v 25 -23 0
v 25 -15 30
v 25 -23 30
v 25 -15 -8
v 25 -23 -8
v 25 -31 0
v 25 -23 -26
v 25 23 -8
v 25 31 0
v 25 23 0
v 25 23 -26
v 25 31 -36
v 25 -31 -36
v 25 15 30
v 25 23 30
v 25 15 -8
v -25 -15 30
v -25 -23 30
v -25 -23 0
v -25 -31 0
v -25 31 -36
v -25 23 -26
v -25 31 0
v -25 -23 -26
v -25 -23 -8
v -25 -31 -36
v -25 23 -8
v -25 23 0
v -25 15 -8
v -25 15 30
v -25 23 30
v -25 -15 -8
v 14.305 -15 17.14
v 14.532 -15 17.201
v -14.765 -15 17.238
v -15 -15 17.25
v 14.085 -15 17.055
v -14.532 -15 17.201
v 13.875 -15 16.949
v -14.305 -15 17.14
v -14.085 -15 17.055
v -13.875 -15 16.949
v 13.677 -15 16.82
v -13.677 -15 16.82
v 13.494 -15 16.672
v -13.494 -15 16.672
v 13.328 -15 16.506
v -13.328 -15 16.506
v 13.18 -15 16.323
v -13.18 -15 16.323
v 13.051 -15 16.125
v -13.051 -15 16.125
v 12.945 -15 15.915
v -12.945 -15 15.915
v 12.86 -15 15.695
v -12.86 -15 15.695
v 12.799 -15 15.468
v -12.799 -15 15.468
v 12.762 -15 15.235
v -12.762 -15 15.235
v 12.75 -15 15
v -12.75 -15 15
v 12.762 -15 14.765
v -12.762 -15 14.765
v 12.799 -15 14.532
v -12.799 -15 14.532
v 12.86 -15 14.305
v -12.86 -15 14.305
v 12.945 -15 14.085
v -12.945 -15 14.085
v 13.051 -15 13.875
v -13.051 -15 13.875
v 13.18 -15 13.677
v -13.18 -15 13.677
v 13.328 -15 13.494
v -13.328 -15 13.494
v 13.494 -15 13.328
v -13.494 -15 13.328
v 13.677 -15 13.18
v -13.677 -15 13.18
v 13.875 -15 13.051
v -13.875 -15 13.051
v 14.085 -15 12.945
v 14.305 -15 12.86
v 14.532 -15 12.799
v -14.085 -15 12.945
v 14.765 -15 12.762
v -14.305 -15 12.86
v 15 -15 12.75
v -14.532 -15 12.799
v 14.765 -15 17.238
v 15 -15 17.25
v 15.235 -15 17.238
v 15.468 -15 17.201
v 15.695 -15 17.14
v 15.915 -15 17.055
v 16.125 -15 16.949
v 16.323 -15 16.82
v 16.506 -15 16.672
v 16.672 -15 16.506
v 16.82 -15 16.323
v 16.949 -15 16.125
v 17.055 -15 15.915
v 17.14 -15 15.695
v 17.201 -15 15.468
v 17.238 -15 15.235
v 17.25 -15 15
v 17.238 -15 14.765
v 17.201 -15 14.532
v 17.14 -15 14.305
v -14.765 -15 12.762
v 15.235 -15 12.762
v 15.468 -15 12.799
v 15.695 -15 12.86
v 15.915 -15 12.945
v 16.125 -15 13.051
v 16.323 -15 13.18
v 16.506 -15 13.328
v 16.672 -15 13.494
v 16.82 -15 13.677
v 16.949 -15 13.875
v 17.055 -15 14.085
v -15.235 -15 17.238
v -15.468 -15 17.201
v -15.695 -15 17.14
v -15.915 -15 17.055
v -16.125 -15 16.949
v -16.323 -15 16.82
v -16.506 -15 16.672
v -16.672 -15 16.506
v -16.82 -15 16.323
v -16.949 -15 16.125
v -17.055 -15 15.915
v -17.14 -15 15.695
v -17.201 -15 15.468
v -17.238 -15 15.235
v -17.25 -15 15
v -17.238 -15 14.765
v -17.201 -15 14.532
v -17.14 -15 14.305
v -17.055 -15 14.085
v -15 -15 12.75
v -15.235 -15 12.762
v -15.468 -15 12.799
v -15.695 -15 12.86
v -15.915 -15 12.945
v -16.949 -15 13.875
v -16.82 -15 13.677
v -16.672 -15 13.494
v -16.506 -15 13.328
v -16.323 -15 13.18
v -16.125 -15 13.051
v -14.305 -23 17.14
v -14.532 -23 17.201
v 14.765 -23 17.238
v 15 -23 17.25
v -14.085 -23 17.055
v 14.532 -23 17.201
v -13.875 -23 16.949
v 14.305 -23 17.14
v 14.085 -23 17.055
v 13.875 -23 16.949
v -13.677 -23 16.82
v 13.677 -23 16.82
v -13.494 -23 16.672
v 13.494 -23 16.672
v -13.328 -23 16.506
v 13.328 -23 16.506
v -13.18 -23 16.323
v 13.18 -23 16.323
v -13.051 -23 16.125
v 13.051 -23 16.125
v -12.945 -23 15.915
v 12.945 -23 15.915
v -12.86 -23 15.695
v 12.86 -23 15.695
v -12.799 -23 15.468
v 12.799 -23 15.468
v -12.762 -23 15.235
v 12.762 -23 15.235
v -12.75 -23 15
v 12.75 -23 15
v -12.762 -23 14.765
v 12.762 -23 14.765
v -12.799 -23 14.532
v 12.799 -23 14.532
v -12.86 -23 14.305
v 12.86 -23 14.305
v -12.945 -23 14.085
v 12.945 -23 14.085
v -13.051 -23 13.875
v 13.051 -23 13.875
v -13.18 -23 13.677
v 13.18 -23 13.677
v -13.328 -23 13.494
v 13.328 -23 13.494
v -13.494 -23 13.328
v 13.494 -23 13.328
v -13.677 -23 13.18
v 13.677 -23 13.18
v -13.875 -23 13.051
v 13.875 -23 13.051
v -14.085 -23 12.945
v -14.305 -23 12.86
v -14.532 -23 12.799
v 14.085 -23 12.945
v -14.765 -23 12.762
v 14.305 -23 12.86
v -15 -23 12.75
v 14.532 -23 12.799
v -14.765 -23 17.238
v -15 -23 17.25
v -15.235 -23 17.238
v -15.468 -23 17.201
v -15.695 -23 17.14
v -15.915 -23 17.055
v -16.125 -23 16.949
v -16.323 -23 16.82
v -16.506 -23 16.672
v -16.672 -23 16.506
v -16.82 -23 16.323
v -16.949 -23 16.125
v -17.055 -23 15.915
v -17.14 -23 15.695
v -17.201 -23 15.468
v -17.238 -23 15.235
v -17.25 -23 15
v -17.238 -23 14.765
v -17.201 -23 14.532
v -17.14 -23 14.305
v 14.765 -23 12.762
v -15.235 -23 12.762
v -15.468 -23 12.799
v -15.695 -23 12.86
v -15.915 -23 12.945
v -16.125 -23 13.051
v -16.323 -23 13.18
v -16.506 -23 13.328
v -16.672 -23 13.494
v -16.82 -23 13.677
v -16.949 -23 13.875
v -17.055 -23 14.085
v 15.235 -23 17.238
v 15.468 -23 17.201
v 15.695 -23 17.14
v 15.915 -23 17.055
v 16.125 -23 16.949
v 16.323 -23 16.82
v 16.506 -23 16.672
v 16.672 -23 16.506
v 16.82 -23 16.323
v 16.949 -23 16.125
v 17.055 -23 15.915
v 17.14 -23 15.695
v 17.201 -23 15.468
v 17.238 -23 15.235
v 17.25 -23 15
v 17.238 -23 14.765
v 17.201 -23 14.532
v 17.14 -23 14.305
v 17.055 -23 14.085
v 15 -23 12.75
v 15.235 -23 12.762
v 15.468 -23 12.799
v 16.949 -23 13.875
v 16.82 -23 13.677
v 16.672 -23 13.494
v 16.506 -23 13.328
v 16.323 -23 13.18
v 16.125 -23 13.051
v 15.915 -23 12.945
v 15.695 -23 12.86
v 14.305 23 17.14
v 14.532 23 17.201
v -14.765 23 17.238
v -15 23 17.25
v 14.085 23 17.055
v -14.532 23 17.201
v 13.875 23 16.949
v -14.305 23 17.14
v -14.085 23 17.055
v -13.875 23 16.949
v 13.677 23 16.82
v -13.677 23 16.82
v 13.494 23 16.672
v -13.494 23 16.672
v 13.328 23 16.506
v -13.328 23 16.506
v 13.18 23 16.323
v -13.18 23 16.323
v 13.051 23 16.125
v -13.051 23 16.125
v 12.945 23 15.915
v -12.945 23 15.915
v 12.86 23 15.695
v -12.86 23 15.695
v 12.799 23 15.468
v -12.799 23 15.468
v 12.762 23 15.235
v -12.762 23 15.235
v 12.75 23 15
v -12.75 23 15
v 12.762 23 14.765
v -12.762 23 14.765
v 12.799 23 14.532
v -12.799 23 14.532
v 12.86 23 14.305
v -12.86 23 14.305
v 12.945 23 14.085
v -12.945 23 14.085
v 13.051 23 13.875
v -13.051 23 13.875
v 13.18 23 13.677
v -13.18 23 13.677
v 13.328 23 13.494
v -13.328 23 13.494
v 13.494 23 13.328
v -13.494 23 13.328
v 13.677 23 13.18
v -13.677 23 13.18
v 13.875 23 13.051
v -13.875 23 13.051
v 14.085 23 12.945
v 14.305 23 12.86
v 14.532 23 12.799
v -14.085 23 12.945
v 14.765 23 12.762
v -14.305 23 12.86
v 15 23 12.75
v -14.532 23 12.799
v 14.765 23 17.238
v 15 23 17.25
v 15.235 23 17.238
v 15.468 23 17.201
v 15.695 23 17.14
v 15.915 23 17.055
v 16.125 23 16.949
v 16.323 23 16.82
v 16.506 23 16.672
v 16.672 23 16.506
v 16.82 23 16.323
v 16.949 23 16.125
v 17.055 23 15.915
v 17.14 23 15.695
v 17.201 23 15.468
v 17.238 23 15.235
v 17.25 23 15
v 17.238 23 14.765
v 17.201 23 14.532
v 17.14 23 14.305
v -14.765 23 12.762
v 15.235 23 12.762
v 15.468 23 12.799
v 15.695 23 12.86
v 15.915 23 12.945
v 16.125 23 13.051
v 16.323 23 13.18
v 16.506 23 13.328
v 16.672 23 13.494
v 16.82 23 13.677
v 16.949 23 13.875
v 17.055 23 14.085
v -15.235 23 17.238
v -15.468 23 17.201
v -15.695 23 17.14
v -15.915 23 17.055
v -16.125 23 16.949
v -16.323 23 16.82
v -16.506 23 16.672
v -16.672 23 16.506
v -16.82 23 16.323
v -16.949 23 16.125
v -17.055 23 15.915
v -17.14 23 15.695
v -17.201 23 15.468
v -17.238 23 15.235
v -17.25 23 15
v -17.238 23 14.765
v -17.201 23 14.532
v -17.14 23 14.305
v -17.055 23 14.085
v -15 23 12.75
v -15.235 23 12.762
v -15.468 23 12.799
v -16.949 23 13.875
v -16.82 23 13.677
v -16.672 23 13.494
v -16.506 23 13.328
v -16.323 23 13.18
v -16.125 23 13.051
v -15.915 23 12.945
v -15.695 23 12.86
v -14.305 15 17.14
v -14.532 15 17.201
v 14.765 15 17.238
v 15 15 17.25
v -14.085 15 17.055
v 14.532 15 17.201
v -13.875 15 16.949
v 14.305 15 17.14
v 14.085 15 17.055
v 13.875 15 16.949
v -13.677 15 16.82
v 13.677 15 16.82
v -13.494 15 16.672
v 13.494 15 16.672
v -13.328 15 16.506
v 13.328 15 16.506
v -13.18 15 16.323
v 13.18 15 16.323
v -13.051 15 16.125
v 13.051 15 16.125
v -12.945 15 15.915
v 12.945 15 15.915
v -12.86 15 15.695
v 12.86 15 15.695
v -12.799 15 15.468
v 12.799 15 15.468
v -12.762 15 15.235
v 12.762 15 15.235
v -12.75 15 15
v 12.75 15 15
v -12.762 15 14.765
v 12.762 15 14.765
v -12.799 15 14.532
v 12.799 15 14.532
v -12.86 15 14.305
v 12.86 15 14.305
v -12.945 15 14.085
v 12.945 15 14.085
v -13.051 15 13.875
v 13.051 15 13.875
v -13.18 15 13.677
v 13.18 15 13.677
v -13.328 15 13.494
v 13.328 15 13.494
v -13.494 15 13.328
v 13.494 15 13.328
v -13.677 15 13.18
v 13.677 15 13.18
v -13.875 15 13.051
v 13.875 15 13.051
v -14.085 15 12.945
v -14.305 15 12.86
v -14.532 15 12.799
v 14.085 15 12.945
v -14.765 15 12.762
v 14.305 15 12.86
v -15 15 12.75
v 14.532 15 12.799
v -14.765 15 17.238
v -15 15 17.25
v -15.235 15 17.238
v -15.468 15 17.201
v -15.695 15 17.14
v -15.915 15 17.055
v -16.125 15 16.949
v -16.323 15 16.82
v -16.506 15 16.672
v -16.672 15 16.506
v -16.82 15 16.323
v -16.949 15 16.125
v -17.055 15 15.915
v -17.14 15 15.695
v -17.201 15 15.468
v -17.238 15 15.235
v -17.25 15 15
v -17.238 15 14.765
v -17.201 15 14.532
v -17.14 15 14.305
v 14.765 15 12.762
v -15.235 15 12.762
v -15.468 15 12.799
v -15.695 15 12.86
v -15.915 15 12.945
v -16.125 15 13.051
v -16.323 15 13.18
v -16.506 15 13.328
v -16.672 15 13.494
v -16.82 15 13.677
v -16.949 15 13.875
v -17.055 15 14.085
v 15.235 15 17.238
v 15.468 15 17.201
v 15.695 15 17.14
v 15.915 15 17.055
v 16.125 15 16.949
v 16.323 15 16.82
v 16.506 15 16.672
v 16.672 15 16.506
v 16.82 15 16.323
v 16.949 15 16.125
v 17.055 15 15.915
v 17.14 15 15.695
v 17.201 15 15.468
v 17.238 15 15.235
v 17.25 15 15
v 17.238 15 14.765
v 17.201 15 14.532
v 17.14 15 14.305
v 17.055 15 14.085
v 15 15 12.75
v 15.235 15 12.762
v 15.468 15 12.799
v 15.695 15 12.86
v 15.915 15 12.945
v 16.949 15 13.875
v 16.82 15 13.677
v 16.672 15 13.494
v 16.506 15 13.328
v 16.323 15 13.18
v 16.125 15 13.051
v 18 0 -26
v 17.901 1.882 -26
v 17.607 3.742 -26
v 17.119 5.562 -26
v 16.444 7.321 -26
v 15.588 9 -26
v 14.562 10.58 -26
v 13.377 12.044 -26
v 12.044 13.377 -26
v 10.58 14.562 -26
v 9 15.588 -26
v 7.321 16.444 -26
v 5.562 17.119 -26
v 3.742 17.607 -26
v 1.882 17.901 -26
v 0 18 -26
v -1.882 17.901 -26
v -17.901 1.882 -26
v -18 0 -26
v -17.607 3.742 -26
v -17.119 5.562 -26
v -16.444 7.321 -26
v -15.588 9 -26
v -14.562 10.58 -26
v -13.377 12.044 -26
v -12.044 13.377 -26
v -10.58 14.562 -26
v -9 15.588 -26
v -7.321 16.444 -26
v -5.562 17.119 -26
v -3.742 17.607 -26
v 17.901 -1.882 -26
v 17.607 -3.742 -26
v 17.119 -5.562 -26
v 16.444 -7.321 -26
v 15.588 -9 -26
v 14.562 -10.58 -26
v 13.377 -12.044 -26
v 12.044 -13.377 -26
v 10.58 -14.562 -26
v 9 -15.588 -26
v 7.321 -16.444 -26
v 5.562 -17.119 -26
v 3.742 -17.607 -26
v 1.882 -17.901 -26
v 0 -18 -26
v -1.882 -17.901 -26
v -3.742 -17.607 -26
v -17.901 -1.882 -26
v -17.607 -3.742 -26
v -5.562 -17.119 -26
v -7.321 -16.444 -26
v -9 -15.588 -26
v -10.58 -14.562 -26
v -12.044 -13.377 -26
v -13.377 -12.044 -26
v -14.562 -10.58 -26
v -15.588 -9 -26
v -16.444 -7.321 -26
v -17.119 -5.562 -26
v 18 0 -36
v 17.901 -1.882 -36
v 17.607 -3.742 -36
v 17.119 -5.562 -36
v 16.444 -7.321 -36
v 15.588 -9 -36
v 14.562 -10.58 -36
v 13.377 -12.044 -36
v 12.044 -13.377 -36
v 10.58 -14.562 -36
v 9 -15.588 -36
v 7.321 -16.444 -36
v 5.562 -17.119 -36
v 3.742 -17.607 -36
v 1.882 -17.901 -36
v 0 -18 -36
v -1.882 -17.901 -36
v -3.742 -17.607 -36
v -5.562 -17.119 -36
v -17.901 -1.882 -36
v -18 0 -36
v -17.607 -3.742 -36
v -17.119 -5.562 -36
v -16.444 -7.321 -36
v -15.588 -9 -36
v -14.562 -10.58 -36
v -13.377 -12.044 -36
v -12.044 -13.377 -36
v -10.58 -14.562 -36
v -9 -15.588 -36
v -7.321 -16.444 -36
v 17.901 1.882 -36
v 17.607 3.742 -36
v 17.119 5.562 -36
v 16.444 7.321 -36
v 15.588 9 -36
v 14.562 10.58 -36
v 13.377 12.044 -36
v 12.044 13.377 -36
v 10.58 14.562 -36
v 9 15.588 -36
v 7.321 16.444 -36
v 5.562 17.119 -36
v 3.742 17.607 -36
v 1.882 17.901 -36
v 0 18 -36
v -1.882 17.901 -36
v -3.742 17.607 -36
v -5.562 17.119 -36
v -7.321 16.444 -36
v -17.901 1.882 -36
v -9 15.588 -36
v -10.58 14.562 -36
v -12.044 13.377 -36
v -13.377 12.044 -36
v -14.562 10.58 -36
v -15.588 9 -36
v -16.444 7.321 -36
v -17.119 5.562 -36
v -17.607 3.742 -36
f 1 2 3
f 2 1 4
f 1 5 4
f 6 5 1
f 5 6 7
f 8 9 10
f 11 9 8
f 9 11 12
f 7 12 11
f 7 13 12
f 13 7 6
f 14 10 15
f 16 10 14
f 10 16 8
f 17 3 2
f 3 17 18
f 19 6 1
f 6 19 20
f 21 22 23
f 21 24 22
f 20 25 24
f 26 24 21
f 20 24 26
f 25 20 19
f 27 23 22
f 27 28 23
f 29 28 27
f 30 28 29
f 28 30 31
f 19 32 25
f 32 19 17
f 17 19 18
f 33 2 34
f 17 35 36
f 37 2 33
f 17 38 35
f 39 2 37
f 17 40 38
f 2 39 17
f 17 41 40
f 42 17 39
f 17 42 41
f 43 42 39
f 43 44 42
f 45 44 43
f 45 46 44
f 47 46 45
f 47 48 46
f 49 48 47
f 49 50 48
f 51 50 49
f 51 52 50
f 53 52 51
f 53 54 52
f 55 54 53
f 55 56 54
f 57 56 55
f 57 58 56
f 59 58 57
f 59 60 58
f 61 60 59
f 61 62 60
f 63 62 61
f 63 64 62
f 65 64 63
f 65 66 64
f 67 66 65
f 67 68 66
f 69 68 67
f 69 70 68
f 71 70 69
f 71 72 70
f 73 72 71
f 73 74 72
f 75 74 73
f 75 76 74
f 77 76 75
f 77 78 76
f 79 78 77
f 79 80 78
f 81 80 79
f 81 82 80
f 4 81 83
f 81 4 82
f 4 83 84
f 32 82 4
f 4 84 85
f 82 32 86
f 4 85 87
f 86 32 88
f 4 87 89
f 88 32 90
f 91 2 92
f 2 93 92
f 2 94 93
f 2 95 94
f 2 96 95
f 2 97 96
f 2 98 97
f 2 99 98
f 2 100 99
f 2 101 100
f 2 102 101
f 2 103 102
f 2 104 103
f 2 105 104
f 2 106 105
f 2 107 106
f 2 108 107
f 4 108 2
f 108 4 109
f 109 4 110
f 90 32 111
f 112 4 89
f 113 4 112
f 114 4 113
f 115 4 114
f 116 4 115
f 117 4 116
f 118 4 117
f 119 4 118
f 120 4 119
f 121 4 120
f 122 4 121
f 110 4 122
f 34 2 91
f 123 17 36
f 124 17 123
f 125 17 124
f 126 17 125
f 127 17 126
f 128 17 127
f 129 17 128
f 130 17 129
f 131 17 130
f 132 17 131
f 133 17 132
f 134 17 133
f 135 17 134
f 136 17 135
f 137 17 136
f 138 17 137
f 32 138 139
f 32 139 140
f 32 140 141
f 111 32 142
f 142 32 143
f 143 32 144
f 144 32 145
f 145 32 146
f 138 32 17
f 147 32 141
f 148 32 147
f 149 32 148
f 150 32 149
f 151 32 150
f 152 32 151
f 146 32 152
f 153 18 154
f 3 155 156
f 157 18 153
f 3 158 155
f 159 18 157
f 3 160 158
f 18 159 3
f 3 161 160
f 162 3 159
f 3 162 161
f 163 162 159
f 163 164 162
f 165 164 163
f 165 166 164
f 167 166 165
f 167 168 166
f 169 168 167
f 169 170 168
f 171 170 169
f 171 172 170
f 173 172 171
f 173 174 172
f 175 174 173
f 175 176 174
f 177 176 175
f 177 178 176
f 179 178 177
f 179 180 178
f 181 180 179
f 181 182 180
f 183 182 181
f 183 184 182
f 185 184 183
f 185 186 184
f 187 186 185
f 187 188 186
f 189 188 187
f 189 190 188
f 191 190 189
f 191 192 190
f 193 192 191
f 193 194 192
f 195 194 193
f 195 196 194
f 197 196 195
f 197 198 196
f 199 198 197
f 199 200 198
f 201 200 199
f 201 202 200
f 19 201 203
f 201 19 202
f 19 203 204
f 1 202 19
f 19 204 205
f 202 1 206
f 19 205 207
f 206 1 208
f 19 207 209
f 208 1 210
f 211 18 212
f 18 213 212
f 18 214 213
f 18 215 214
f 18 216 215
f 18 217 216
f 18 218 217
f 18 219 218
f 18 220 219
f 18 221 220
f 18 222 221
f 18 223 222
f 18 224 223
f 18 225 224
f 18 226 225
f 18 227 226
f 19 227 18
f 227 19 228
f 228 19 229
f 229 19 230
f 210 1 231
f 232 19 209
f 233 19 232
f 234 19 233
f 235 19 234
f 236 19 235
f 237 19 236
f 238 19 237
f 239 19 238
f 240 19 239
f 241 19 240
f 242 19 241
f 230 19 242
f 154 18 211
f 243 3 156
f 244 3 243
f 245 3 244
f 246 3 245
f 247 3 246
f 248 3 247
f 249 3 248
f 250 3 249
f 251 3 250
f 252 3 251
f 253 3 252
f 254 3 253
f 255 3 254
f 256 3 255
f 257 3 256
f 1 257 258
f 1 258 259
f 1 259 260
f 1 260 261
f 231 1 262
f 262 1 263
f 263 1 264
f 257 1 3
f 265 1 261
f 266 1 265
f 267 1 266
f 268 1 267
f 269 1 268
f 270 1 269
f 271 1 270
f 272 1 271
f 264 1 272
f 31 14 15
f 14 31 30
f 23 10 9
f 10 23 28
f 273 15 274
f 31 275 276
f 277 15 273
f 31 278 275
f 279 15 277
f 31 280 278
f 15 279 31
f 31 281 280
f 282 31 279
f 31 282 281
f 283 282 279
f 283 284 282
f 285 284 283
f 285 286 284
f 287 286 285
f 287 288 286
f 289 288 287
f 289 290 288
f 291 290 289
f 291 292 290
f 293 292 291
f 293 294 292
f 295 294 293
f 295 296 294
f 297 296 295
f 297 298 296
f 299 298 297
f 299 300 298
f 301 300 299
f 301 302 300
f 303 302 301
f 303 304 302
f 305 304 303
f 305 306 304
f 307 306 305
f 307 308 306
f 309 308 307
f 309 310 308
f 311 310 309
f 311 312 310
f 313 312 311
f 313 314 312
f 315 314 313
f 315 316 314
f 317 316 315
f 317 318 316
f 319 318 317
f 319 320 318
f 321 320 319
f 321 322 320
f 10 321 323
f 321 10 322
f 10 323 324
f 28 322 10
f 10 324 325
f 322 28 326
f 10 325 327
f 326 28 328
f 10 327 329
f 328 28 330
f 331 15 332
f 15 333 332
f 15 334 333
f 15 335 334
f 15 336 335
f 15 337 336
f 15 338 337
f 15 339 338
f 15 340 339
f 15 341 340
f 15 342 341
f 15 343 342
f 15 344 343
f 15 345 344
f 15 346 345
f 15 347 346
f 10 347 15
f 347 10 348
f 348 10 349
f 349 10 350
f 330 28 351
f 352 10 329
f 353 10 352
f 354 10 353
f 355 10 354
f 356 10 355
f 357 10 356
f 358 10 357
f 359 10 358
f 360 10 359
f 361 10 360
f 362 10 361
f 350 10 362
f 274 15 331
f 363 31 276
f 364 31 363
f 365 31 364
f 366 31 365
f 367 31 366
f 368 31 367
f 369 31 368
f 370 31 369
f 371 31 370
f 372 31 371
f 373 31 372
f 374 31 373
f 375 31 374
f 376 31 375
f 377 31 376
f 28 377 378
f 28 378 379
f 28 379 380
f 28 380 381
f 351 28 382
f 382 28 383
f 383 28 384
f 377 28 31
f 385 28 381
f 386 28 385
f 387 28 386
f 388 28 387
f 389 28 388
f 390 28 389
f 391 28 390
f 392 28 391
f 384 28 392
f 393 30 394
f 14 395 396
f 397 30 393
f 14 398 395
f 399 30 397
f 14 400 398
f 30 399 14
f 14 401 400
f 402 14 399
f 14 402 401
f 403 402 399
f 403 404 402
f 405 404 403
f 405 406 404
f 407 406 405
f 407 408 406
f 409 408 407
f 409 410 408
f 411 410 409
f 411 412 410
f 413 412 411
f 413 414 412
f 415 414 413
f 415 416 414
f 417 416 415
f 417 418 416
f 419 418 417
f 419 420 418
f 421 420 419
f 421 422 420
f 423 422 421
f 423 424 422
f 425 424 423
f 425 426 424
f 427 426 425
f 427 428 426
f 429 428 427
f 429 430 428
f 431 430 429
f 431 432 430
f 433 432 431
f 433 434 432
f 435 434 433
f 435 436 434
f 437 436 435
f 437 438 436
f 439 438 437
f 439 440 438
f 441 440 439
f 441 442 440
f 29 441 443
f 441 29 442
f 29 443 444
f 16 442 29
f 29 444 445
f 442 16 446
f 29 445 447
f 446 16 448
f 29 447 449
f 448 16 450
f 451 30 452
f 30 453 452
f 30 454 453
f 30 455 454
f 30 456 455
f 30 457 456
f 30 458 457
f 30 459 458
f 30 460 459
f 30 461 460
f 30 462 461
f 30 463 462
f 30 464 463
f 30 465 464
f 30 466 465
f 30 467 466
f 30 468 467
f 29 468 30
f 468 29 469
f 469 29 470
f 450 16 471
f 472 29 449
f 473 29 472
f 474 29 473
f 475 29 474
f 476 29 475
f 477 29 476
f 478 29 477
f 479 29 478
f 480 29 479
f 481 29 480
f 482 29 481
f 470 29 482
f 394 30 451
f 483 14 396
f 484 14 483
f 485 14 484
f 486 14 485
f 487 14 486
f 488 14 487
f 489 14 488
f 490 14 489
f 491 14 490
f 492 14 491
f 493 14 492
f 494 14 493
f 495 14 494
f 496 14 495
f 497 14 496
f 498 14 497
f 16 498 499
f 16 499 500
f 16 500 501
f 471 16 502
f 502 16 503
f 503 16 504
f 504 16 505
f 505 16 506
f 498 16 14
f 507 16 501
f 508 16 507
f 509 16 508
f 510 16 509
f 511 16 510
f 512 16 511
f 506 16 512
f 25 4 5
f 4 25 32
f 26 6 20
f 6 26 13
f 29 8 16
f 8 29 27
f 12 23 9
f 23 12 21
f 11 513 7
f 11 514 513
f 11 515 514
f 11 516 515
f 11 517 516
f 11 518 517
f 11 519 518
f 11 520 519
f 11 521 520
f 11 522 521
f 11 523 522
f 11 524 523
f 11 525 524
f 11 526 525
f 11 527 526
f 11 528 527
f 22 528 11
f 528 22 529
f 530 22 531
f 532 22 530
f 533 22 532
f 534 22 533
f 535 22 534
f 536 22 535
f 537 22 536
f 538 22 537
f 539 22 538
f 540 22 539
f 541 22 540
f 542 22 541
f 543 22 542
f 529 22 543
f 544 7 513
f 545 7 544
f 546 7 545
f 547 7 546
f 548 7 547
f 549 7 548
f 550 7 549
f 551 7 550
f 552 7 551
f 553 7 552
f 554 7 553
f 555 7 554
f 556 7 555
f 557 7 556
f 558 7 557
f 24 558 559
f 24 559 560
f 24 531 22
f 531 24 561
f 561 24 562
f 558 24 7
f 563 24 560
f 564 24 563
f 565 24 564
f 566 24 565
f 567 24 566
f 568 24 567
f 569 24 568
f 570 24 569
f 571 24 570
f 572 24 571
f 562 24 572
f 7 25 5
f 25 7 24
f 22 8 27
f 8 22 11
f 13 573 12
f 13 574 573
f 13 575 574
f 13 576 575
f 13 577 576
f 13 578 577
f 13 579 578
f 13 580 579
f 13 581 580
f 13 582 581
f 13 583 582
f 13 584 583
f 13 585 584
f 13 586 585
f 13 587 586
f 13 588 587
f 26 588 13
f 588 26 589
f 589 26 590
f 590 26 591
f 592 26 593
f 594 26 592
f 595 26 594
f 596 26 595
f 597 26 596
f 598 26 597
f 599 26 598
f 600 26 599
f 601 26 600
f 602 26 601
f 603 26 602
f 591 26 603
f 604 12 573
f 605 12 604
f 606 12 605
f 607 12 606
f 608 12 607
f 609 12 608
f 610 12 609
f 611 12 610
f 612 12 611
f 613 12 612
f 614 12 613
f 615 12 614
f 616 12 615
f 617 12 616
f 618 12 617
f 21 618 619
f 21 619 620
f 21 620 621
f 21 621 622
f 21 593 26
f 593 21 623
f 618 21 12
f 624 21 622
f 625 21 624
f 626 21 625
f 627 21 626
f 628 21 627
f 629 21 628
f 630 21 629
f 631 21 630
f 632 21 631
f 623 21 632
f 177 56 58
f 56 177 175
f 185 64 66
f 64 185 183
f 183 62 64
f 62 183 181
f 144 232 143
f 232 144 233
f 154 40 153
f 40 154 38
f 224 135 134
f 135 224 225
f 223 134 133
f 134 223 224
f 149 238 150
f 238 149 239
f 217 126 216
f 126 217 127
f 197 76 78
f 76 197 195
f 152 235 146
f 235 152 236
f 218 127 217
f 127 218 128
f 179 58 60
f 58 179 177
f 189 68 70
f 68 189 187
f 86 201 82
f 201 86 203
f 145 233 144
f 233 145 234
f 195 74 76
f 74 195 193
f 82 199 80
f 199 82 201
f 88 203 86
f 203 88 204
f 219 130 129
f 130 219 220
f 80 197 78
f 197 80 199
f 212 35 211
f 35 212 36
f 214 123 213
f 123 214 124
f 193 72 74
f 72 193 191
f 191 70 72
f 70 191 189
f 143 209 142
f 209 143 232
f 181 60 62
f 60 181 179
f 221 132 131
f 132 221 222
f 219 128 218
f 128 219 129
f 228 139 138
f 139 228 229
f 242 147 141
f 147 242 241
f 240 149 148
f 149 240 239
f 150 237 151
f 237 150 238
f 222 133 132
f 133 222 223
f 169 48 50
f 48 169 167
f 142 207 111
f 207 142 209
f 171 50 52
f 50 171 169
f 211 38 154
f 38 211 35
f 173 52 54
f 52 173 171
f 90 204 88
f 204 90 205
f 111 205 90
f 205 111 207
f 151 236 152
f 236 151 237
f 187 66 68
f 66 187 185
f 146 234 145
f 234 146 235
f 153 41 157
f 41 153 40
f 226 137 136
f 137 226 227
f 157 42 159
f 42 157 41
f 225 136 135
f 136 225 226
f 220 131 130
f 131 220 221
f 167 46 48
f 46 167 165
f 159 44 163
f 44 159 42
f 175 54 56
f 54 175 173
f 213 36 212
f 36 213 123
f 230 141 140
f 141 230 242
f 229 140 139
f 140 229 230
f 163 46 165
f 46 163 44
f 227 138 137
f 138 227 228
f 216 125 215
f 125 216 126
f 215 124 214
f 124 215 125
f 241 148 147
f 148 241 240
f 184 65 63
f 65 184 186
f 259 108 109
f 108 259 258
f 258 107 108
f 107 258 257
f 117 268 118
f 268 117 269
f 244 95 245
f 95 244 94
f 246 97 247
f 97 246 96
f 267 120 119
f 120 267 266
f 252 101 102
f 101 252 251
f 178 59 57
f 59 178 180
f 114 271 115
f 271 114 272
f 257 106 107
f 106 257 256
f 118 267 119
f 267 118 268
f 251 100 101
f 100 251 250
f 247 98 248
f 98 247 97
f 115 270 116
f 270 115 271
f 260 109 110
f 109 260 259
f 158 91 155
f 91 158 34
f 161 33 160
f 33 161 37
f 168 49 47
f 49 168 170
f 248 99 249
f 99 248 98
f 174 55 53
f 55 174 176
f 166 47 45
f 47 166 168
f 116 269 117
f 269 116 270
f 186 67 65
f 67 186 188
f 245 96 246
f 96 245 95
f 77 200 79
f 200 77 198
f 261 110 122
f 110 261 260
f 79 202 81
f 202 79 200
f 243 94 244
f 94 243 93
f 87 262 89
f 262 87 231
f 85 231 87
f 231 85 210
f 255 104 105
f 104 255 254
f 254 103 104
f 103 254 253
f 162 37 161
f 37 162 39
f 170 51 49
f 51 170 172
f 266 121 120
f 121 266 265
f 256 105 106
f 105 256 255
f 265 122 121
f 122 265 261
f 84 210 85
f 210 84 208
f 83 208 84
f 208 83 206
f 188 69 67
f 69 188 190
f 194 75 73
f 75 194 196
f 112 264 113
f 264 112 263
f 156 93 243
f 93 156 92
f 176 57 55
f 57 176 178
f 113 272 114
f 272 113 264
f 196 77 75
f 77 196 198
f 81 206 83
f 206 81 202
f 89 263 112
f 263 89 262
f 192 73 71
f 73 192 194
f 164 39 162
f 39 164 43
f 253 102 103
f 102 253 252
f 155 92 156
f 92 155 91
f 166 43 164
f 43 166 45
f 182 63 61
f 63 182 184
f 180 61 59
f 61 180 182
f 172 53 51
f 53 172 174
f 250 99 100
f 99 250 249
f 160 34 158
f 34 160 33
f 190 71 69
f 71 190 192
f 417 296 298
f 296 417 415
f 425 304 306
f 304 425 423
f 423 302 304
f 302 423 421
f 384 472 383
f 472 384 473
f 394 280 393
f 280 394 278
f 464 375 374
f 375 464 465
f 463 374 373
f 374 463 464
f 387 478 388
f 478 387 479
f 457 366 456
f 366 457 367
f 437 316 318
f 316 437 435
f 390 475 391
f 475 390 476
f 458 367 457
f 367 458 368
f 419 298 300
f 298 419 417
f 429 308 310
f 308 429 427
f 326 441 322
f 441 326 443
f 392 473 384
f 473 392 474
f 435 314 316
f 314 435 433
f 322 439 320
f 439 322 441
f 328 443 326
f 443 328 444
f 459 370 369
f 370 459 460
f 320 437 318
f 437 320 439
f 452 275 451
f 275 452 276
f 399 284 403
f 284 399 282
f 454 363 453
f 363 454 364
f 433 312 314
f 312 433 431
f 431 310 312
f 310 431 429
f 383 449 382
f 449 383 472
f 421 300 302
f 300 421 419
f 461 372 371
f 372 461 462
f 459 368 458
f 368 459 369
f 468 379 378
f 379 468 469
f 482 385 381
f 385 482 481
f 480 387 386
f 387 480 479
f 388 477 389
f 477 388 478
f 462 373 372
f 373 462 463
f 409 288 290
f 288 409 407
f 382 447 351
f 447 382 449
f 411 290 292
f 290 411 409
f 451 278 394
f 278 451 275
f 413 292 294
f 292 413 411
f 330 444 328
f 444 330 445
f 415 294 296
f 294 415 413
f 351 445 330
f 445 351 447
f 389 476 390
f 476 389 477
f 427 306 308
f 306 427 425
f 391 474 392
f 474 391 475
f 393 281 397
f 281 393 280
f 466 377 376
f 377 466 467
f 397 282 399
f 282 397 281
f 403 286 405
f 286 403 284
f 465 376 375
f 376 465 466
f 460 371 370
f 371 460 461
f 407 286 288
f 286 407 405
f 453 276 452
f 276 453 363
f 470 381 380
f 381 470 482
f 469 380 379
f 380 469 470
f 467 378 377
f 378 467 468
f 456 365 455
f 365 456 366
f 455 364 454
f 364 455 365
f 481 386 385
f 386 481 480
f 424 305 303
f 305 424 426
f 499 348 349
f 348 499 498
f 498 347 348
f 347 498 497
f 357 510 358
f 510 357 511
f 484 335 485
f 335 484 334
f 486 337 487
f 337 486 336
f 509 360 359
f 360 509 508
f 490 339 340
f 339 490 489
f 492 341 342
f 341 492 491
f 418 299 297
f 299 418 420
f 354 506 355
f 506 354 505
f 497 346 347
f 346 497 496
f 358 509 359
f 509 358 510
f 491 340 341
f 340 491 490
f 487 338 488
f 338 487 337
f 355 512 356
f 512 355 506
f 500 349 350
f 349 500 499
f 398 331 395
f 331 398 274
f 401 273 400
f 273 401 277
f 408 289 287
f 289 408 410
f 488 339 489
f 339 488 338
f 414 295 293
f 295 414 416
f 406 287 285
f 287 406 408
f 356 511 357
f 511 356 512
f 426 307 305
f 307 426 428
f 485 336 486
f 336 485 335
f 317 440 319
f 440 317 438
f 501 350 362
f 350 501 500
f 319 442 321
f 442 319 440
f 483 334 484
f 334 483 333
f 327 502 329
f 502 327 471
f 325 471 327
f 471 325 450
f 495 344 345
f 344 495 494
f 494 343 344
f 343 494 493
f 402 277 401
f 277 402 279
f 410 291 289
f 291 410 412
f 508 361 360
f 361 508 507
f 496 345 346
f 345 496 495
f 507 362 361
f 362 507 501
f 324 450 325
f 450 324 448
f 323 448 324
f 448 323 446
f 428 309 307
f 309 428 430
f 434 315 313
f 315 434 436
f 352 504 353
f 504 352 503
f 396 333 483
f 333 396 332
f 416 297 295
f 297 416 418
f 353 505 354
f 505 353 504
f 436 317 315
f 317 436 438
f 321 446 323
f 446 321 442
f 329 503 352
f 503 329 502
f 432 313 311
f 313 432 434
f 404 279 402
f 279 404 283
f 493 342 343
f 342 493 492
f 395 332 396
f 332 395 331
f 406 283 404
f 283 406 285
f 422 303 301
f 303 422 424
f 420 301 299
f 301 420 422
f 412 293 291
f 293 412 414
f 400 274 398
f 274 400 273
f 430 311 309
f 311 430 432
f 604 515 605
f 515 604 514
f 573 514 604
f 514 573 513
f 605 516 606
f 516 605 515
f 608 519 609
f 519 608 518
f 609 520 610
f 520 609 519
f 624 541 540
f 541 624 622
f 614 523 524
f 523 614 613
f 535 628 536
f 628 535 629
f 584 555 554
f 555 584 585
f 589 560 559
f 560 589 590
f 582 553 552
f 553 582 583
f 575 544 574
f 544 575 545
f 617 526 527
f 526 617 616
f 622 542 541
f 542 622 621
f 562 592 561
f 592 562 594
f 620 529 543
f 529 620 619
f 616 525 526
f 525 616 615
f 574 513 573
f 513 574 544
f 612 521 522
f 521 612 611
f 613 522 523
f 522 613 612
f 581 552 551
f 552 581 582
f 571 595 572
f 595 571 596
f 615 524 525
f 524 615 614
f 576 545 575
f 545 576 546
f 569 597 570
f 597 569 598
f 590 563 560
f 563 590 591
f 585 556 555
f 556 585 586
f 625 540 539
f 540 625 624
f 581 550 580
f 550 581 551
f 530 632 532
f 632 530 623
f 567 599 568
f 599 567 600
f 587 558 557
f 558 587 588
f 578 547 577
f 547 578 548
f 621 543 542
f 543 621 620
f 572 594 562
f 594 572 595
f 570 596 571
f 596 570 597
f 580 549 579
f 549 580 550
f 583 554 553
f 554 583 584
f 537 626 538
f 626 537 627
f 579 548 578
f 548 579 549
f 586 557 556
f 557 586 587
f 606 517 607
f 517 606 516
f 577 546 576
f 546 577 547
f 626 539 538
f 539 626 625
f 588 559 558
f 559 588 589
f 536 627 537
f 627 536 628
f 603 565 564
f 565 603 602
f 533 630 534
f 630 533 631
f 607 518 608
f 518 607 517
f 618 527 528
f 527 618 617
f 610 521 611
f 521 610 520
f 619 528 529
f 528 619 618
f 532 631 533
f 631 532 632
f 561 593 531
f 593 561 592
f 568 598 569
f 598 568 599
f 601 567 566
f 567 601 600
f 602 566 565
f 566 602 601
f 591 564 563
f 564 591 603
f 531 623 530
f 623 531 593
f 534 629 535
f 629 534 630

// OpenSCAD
// file: _params.scad
// =========================================================================
// 공유 파라미터 (모든 개별 부품 파일에서 include)
// 메인 어셈블리: cup_z_x_catrage_frame_water_mic_anti_3030.scad 에서 추출
// 프레임: 600 × 420 × 700mm (3030 프로파일, Y=0 대칭)
// =========================================================================

$fn = 60;  // 부품 출력용 고해상도
GLOBAL_TOLERANCE = 0.2;

// --- [1] 하부 기성품 및 원통 파라미터 ---
X_RAIL_LEN = 290.0;
X_BLOCK_W = 42.0; X_BLOCK_L = 59.0;
X_PITCH_X = 20.0; X_PITCH_Y = 32.0;
X_RAIL_W = 40.0;  X_RAIL_H = 30.0;

MOTOR_W = 42.0;      MOTOR_PITCH = 31.0; MOTOR_HOLE_D = 3.5;    
MOTOR_BOSS_D = 22.0; MOTOR_BOSS_H = 2.0; SCREW_D = 8.0;         

CUP_ID = 100.0;  CUP_WALL = 5.0; CUP_OD = 110.0;     // 아크릴 원통 OD110/ID100
CUP_H = 180.0;   CAGE_H = 60.0;  FLOOR_H = 10.0; PISTON_H = 20.0;     

LIP_D = 30.0;    LIP_H = 5.0;    LEAK_DRAIN_D = 4.0;    
GUIDE_PIPE_D = 10.0; BUSHING_OD = 12.0; BUSHING_H = 8.0;       
DRAIN_RADIUS = 35.0; DRAIN_D = 10.0;        

Y_OFFSET = 85.0; BRKT_H = 12.0; BRKT_D = 122.0; BRKT_ID = 62.0; Z_MOUNT_PCD = 86.0;   

// --- [2] 아크릴 파이프 및 상부 카트리지 ---
ACRYL_ID = 100.0; ACRYL_T = 5.0; ACRYL_OD = ACRYL_ID + (ACRYL_T * 2);  // OD110 (아크릴집 106 재고없음 → 컵과 동일 규격)

REVOLVER_PCD = 240.0;     // 인접 카트리지 웹 9.8mm 확보 (OD110 대응, 230→240)
CARTRIDGE_OD = REVOLVER_PCD + ACRYL_OD + 8; 
TOP_PLATE_H = 15.0;       // 아크릴 15T 통판 (보스홀 단 깊이 10mm)

HUB_D = 60.0;            
SHAFT_D = 12.0;          
HUB_WALL = 4.0;          
HUB_H = 15.0;             // 아크릴 5T × 3장 적층 — 파이프 130mm 대응
POCKET_DEPTH = 5.0;
MID_HUB_Z = 68.5;          // 중단 허브 하면 Z (FLOAT_H=2 보정, 절대좌표 유지)
UPPER_HUB_Z = 135.0;       // 상단 허브 하면 Z (전체 135+15=150 유지)
BOSS_OD = 35.0;
BOSS_H = 11.0;             // 보스11 + 와셔1 = 12, 리세스10 → 허브 2mm 공중

// --- [3] GT2 벨트 구동 시스템 ---
GT2_PITCH     = 2.0;
GT2_BELT_W    = 6.0;
BIG_PULLEY_TEETH = 566;
BIG_PULLEY_PD = BIG_PULLEY_TEETH * GT2_PITCH / PI;
BIG_PULLEY_OD = BIG_PULLEY_PD + 1.0;
SMALL_PULLEY_TEETH = 20;
SMALL_PULLEY_PD = SMALL_PULLEY_TEETH * GT2_PITCH / PI;
SMALL_PULLEY_OD = SMALL_PULLEY_PD + 1.0;

BELT_MOTOR_X = -300;
BELT_MOTOR_Y = -155.5;
BRKT_MOTOR_H = 25.0;
BRKT_MOTOR_W = 45.0;
SLOT_LEN = 10.0;
FLAG_W = 15.0;  FLAG_H = 8.0;  FLAG_T = 1.5;

X_POS_MEASURE = 170.0;   // X_M~X_R 정중앙, X대칭

// --- [4] 3030 프레임 경계 (600×430×700mm) ---
PF = 30;             // 3030 알루미늄 프로파일
WASHER_T = 1.0;     

X_L = -320;
X_M = 60;
X_R = 250;
Y_F = -210;          // 전방 (대칭: -210+30=-180, Y=0 중심)
Y_B = 180;           // 후방 (대칭: 180+30=210, Y=0 중심) — 메인파일과 동기화

Z_BOT = -480;
Z_RAIL = -322;
Z_MID = -TOP_PLATE_H - PF;
Z_TOP = 220;

SUPPORT_PILLAR_H = Z_TOP - PF;

SHAFT_SQ = 20;       // 2020 사각 회전축

// 사각 축 홀 크기
SQ = SHAFT_SQ + GLOBAL_TOLERANCE;  // 20.2mm

// --- 리볼버/컵 축 정렬 (보스홀=판 중심에 리볼버 정렬) ---
REVOLVER_CX = (X_L + X_M + PF)/2;        // 판 중심 = 보스홀 = 리볼버 회전축 (-115)
DROP_X      = REVOLVER_CX + REVOLVER_PCD/2;  // 링 드롭 / 컵 적재 축 (+5)

// --- [5] 모터 체결홀 (베이스 플레이트 ↔ 모터 브래킷 슬롯 공유) ---
MOTOR_BOLT_PITCH    = 25;        // Y피치 (모터축 기준 ±12.5)
MOTOR_BOLT_X_NOMINAL = X_L + 55; // 1열: 판 좌단 55 (모터 기본 위치)
MOTOR_BOLT_X_SHIFT   = X_L + 40; // 2열: 판 좌단 40 (모터 좌측 이동 대비)

// 모터 마운트 볼트 카운터보어 (단볼트용 — 브래킷 두께 25 중 깊게 파냄)
MOTOR_CB_D     = 6.5;            // M3 캡볼트 머리 클리어런스
MOTOR_CB_DEPTH = 19;             // 카운터보어 깊이 (잔여 통과 6mm → M3×10 단볼트)
// main file
// =========================================================================
// [부품] 상부 축 브래킷 (Upper Shaft Support Bracket)
// 가공: 3D 프린팅 (PLA)
// 원점: 보 상면 = Z=0, 축 중심 = XY 원점
// =========================================================================
include <_params.scad>

BRKT_T = 8.0;
BOTTOM_T = 10.0;
FLOAT_H = BOSS_H + WASHER_T - 10;  // 리볼버 Z 오프셋 (2mm)
UPPER_GAP = 2.0;           // 상단 허브 상면↔바닥판 하면 간격
DROP_H = (Z_TOP - PF) - (FLOAT_H + UPPER_HUB_Z + HUB_H + UPPER_GAP + BOTTOM_T);
BOSS_CLEAR = BOSS_OD + 1.0;
PLATE_W = 50.0;
HALF_BEAM = PF / 2;
HALF_GAP = BOSS_CLEAR/2 + 5;

difference() {
    union() {
        // ㅛ 상부: 좌측 탭
        translate([-PLATE_W/2, -HALF_BEAM - BRKT_T, 0])
            cube([PLATE_W, BRKT_T, PF]);
        // ㅛ 상부: 우측 탭
        translate([-PLATE_W/2, HALF_BEAM, 0])
            cube([PLATE_W, BRKT_T, PF]);
        // ㅛ 연결: 좌측 수평 연결판
        translate([-PLATE_W/2, -HALF_GAP - BRKT_T, -BRKT_T])
            cube([PLATE_W, HALF_GAP + BRKT_T - HALF_BEAM, BRKT_T]);
        // ㅛ 연결: 우측 수평 연결판
        translate([-PLATE_W/2, HALF_BEAM, -BRKT_T])
            cube([PLATE_W, HALF_GAP + BRKT_T - HALF_BEAM, BRKT_T]);
        // ㅛ 하부: 좌측 벽
        translate([-PLATE_W/2, -HALF_GAP - BRKT_T, -DROP_H])
            cube([PLATE_W, BRKT_T, DROP_H - BRKT_T]);
        // ㅛ 하부: 우측 벽
        translate([-PLATE_W/2, HALF_GAP, -DROP_H])
            cube([PLATE_W, BRKT_T, DROP_H - BRKT_T]);
        // ㅛ 하부: 바닥판
        translate([-PLATE_W/2, -HALF_GAP - BRKT_T, -DROP_H - BOTTOM_T])
            cube([PLATE_W, (HALF_GAP + BRKT_T) * 2, BOTTOM_T]);
    }
    // 보스 관통홀
    translate([0, 0, -DROP_H - BOTTOM_T - 1]) cylinder(d=BOSS_CLEAR, h=BOTTOM_T + 2);
    // 좌측 보 체결 볼트
    for(dx = [-15, 15])
        translate([dx, -HALF_BEAM - BRKT_T - 1, PF/2])
            rotate([-90, 0, 0]) cylinder(d=4.5, h=BRKT_T + 2);
    // 우측 보 체결 볼트
    for(dx = [-15, 15])
        translate([dx, HALF_BEAM - 1, PF/2])
            rotate([-90, 0, 0]) cylinder(d=4.5, h=BRKT_T + 2);
}
